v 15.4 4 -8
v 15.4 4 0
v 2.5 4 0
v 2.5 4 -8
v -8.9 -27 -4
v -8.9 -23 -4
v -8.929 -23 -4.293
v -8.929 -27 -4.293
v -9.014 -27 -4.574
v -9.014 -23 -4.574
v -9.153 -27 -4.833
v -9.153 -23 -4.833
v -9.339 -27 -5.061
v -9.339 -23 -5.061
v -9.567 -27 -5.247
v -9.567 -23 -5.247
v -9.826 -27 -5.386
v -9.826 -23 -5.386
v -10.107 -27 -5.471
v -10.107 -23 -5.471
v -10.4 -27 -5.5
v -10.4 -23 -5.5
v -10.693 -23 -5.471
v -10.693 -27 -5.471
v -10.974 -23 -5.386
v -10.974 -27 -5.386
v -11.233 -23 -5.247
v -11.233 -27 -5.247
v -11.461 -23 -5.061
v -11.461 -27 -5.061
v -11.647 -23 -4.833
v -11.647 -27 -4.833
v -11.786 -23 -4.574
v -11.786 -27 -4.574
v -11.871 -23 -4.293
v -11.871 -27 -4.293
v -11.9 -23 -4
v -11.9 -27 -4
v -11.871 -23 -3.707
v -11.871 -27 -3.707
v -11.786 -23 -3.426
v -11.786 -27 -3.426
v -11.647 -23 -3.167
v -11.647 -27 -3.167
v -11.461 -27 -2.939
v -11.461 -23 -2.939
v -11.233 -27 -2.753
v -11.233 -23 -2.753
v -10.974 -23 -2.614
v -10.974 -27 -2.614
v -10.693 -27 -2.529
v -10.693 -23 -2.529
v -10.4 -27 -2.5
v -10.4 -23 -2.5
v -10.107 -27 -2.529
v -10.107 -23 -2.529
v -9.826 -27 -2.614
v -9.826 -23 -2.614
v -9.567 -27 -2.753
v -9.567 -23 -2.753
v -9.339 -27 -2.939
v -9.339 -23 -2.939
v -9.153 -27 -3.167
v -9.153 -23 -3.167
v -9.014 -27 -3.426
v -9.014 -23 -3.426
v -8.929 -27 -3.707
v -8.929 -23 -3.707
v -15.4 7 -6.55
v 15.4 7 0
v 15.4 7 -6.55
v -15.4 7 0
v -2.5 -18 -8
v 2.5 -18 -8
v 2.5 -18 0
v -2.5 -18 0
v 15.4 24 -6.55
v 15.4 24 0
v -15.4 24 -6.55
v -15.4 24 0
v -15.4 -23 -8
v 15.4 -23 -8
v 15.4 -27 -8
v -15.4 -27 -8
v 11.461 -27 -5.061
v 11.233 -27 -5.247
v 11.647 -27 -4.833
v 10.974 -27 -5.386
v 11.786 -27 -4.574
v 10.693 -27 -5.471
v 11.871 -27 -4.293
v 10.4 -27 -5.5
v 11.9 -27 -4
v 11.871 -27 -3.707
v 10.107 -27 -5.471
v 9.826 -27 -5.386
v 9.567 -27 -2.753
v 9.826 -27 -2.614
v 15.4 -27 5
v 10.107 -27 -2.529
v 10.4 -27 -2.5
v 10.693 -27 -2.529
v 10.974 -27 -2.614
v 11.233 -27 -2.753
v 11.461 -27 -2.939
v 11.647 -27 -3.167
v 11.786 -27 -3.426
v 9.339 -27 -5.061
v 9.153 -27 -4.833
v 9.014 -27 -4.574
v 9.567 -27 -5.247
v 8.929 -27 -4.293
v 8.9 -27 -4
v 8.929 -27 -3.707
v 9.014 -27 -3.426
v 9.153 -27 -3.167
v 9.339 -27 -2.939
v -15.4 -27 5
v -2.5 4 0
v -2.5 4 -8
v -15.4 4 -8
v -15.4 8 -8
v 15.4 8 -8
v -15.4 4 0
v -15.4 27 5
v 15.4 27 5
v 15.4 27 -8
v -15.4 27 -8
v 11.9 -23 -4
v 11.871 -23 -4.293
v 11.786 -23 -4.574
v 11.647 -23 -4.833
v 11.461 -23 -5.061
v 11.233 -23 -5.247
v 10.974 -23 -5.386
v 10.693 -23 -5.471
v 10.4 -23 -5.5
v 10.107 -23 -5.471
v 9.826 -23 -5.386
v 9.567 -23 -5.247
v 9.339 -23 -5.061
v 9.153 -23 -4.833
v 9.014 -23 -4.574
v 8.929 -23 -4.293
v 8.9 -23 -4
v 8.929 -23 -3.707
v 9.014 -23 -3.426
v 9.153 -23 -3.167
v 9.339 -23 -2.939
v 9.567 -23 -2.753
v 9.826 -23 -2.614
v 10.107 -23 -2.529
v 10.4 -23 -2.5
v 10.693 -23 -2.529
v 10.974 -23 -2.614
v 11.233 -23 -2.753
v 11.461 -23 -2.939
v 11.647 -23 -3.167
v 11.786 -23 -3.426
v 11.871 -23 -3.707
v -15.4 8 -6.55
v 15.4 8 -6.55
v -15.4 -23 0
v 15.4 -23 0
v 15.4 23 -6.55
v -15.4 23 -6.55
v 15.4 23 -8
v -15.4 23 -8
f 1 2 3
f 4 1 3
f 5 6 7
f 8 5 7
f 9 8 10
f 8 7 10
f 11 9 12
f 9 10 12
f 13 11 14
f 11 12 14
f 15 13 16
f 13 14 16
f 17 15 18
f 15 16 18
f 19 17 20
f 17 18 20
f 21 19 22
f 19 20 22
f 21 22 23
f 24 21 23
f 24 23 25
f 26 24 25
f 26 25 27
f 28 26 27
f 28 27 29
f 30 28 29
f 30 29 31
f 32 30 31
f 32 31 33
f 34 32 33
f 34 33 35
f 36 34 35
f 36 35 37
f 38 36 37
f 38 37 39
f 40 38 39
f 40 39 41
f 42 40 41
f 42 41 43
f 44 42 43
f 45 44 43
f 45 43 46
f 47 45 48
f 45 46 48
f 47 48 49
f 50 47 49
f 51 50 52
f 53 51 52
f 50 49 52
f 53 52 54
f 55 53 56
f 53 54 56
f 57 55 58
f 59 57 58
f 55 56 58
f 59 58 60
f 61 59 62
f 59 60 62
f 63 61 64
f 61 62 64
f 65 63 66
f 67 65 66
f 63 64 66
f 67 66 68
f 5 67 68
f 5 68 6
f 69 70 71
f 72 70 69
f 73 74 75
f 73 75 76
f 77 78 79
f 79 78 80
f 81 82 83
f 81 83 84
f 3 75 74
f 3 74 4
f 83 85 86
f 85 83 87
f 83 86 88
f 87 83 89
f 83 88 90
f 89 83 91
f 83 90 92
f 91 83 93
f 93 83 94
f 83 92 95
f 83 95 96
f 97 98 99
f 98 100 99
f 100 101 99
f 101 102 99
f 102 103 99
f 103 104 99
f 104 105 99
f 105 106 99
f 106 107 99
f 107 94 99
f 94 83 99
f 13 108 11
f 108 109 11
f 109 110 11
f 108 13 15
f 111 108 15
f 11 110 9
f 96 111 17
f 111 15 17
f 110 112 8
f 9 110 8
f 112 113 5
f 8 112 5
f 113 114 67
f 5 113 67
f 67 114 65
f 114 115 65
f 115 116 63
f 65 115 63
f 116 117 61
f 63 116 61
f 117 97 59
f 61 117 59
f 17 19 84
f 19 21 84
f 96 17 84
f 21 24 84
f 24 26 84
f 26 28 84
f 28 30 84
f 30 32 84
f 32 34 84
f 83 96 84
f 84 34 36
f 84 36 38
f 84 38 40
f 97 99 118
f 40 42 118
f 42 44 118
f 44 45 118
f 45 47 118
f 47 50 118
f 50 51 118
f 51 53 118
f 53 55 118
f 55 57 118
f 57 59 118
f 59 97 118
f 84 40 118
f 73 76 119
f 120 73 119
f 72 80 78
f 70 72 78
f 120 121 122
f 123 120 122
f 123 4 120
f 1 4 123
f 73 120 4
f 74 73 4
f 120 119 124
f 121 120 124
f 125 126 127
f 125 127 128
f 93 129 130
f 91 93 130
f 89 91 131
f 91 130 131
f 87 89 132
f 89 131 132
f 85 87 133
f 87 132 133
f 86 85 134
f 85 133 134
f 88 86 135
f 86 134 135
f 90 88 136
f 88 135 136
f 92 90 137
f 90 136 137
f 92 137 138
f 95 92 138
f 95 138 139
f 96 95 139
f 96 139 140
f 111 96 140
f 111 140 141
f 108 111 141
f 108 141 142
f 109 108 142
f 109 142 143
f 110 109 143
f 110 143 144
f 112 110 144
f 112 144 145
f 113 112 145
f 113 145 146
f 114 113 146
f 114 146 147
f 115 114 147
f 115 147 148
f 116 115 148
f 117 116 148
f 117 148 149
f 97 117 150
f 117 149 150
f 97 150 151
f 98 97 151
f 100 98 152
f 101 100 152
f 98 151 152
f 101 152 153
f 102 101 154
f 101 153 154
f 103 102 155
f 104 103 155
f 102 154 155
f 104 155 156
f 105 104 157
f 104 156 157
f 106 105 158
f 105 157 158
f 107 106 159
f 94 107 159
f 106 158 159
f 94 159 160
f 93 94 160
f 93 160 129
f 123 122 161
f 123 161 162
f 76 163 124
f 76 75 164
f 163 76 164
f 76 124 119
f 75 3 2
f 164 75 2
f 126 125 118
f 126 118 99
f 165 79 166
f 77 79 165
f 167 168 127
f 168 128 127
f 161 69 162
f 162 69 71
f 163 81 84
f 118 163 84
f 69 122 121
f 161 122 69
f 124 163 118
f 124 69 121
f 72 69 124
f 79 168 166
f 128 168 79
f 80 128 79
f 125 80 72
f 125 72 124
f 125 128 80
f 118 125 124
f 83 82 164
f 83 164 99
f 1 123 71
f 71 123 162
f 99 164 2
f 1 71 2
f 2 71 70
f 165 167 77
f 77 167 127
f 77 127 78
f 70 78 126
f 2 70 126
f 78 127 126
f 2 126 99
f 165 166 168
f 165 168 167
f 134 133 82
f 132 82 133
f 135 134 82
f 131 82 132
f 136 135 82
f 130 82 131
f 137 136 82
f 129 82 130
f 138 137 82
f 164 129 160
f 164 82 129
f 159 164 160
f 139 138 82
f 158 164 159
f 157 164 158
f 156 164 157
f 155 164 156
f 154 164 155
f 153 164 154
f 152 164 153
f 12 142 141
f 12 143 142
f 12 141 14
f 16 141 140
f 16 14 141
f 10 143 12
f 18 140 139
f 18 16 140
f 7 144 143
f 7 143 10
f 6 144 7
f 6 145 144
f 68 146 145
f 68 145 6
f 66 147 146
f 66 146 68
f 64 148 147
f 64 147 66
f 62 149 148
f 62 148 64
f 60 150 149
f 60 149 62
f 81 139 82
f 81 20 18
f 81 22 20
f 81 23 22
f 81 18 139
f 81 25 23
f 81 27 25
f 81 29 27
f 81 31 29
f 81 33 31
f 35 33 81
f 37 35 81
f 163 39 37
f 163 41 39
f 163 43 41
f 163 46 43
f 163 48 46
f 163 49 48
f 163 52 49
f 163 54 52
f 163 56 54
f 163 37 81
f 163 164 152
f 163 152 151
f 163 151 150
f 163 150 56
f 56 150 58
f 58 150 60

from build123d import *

# Parameters (mm, degrees)
SKETCH_1_W          = 30.8
SKETCH_1_H          = 54
EXTRUDE_1_DEPTH     = 5
SKETCH_2_W          = 30.8
SKETCH_2_H          = 4
EXTRUDE_2_DEPTH     = 8
SKETCH_3_R          = 1.5
CUT_EXTRUDE_1_DEPTH = 5
SKETCH_4_W          = 30.8
SKETCH_4_H          = 3
EXTRUDE_3_DEPTH     = 8
SKETCH_5_W          = 30.8
SKETCH_5_H          = 1.45
EXTRUDE_4_DEPTH     = 1
SKETCH_6_W          = 30.8
SKETCH_6_H          = 1.45
EXTRUDE_5_DEPTH     = 1
SKETCH_7_W          = 5
SKETCH_7_H          = 22
EXTRUDE_6_DEPTH     = 8


with BuildPart() as part:
    # 草图1 → 凸台-拉伸1 (new body)
    with BuildSketch(Plane.XY):
        Rectangle(SKETCH_1_W, SKETCH_1_H)
    extrude(amount=EXTRUDE_1_DEPTH)

    # 草图2 → 凸台-拉伸2 (add)
    with BuildSketch(Plane(origin=(0, 0, 0), x_dir=(-1, 0, 0), z_dir=(0, 0, -1))):
        with Locations((0, -25)):
            Rectangle(SKETCH_2_W, SKETCH_2_H)
    extrude(amount=EXTRUDE_2_DEPTH)

    # 草图3 → 切除-拉伸1 (cut, through all)
    with BuildSketch(Plane(origin=(0, -23, 0), x_dir=(1, 0, 0), z_dir=(0, 1, 0))):
        with Locations((10.4, 4)):
            Circle(SKETCH_3_R)
        with Locations((-10.4, 4)):
            Circle(SKETCH_3_R)
    extrude(amount=-CUT_EXTRUDE_1_DEPTH, mode=Mode.SUBTRACT)

    # 草图4 → 凸台-拉伸3 (add)
    with BuildSketch(Plane(origin=(0, 0, 0), x_dir=(-1, 0, 0), z_dir=(0, 0, -1))):
        with Locations((0, 25.5)):
            Rectangle(SKETCH_4_W, SKETCH_4_H)
        with Locations((0, 5.5)):
            Rectangle(SKETCH_4_W, SKETCH_4_H)
    extrude(amount=EXTRUDE_3_DEPTH)

    # 草图5 → 凸台-拉伸4 (add)
    with BuildSketch(Plane(origin=(0, 7, 0), x_dir=(1, 0, 0), z_dir=(0, 1, 0))):
        with Locations((0, 7.275)):
            Rectangle(SKETCH_5_W, SKETCH_5_H)
    extrude(amount=EXTRUDE_4_DEPTH)

    # 草图6 → 凸台-拉伸5 (add)
    with BuildSketch(Plane.XZ.offset(-24)):
        with Locations((0, -7.275)):
            Rectangle(SKETCH_6_W, SKETCH_6_H)
    extrude(amount=EXTRUDE_5_DEPTH)

    # 草图7 → 凸台-拉伸6 (add)
    with BuildSketch(Plane(origin=(0, 0, 0), x_dir=(-1, 0, 0), z_dir=(0, 0, -1))):
        with Locations((0, -7)):
            Rectangle(SKETCH_7_W, SKETCH_7_H)
    extrude(amount=EXTRUDE_6_DEPTH)


solid = part.part
